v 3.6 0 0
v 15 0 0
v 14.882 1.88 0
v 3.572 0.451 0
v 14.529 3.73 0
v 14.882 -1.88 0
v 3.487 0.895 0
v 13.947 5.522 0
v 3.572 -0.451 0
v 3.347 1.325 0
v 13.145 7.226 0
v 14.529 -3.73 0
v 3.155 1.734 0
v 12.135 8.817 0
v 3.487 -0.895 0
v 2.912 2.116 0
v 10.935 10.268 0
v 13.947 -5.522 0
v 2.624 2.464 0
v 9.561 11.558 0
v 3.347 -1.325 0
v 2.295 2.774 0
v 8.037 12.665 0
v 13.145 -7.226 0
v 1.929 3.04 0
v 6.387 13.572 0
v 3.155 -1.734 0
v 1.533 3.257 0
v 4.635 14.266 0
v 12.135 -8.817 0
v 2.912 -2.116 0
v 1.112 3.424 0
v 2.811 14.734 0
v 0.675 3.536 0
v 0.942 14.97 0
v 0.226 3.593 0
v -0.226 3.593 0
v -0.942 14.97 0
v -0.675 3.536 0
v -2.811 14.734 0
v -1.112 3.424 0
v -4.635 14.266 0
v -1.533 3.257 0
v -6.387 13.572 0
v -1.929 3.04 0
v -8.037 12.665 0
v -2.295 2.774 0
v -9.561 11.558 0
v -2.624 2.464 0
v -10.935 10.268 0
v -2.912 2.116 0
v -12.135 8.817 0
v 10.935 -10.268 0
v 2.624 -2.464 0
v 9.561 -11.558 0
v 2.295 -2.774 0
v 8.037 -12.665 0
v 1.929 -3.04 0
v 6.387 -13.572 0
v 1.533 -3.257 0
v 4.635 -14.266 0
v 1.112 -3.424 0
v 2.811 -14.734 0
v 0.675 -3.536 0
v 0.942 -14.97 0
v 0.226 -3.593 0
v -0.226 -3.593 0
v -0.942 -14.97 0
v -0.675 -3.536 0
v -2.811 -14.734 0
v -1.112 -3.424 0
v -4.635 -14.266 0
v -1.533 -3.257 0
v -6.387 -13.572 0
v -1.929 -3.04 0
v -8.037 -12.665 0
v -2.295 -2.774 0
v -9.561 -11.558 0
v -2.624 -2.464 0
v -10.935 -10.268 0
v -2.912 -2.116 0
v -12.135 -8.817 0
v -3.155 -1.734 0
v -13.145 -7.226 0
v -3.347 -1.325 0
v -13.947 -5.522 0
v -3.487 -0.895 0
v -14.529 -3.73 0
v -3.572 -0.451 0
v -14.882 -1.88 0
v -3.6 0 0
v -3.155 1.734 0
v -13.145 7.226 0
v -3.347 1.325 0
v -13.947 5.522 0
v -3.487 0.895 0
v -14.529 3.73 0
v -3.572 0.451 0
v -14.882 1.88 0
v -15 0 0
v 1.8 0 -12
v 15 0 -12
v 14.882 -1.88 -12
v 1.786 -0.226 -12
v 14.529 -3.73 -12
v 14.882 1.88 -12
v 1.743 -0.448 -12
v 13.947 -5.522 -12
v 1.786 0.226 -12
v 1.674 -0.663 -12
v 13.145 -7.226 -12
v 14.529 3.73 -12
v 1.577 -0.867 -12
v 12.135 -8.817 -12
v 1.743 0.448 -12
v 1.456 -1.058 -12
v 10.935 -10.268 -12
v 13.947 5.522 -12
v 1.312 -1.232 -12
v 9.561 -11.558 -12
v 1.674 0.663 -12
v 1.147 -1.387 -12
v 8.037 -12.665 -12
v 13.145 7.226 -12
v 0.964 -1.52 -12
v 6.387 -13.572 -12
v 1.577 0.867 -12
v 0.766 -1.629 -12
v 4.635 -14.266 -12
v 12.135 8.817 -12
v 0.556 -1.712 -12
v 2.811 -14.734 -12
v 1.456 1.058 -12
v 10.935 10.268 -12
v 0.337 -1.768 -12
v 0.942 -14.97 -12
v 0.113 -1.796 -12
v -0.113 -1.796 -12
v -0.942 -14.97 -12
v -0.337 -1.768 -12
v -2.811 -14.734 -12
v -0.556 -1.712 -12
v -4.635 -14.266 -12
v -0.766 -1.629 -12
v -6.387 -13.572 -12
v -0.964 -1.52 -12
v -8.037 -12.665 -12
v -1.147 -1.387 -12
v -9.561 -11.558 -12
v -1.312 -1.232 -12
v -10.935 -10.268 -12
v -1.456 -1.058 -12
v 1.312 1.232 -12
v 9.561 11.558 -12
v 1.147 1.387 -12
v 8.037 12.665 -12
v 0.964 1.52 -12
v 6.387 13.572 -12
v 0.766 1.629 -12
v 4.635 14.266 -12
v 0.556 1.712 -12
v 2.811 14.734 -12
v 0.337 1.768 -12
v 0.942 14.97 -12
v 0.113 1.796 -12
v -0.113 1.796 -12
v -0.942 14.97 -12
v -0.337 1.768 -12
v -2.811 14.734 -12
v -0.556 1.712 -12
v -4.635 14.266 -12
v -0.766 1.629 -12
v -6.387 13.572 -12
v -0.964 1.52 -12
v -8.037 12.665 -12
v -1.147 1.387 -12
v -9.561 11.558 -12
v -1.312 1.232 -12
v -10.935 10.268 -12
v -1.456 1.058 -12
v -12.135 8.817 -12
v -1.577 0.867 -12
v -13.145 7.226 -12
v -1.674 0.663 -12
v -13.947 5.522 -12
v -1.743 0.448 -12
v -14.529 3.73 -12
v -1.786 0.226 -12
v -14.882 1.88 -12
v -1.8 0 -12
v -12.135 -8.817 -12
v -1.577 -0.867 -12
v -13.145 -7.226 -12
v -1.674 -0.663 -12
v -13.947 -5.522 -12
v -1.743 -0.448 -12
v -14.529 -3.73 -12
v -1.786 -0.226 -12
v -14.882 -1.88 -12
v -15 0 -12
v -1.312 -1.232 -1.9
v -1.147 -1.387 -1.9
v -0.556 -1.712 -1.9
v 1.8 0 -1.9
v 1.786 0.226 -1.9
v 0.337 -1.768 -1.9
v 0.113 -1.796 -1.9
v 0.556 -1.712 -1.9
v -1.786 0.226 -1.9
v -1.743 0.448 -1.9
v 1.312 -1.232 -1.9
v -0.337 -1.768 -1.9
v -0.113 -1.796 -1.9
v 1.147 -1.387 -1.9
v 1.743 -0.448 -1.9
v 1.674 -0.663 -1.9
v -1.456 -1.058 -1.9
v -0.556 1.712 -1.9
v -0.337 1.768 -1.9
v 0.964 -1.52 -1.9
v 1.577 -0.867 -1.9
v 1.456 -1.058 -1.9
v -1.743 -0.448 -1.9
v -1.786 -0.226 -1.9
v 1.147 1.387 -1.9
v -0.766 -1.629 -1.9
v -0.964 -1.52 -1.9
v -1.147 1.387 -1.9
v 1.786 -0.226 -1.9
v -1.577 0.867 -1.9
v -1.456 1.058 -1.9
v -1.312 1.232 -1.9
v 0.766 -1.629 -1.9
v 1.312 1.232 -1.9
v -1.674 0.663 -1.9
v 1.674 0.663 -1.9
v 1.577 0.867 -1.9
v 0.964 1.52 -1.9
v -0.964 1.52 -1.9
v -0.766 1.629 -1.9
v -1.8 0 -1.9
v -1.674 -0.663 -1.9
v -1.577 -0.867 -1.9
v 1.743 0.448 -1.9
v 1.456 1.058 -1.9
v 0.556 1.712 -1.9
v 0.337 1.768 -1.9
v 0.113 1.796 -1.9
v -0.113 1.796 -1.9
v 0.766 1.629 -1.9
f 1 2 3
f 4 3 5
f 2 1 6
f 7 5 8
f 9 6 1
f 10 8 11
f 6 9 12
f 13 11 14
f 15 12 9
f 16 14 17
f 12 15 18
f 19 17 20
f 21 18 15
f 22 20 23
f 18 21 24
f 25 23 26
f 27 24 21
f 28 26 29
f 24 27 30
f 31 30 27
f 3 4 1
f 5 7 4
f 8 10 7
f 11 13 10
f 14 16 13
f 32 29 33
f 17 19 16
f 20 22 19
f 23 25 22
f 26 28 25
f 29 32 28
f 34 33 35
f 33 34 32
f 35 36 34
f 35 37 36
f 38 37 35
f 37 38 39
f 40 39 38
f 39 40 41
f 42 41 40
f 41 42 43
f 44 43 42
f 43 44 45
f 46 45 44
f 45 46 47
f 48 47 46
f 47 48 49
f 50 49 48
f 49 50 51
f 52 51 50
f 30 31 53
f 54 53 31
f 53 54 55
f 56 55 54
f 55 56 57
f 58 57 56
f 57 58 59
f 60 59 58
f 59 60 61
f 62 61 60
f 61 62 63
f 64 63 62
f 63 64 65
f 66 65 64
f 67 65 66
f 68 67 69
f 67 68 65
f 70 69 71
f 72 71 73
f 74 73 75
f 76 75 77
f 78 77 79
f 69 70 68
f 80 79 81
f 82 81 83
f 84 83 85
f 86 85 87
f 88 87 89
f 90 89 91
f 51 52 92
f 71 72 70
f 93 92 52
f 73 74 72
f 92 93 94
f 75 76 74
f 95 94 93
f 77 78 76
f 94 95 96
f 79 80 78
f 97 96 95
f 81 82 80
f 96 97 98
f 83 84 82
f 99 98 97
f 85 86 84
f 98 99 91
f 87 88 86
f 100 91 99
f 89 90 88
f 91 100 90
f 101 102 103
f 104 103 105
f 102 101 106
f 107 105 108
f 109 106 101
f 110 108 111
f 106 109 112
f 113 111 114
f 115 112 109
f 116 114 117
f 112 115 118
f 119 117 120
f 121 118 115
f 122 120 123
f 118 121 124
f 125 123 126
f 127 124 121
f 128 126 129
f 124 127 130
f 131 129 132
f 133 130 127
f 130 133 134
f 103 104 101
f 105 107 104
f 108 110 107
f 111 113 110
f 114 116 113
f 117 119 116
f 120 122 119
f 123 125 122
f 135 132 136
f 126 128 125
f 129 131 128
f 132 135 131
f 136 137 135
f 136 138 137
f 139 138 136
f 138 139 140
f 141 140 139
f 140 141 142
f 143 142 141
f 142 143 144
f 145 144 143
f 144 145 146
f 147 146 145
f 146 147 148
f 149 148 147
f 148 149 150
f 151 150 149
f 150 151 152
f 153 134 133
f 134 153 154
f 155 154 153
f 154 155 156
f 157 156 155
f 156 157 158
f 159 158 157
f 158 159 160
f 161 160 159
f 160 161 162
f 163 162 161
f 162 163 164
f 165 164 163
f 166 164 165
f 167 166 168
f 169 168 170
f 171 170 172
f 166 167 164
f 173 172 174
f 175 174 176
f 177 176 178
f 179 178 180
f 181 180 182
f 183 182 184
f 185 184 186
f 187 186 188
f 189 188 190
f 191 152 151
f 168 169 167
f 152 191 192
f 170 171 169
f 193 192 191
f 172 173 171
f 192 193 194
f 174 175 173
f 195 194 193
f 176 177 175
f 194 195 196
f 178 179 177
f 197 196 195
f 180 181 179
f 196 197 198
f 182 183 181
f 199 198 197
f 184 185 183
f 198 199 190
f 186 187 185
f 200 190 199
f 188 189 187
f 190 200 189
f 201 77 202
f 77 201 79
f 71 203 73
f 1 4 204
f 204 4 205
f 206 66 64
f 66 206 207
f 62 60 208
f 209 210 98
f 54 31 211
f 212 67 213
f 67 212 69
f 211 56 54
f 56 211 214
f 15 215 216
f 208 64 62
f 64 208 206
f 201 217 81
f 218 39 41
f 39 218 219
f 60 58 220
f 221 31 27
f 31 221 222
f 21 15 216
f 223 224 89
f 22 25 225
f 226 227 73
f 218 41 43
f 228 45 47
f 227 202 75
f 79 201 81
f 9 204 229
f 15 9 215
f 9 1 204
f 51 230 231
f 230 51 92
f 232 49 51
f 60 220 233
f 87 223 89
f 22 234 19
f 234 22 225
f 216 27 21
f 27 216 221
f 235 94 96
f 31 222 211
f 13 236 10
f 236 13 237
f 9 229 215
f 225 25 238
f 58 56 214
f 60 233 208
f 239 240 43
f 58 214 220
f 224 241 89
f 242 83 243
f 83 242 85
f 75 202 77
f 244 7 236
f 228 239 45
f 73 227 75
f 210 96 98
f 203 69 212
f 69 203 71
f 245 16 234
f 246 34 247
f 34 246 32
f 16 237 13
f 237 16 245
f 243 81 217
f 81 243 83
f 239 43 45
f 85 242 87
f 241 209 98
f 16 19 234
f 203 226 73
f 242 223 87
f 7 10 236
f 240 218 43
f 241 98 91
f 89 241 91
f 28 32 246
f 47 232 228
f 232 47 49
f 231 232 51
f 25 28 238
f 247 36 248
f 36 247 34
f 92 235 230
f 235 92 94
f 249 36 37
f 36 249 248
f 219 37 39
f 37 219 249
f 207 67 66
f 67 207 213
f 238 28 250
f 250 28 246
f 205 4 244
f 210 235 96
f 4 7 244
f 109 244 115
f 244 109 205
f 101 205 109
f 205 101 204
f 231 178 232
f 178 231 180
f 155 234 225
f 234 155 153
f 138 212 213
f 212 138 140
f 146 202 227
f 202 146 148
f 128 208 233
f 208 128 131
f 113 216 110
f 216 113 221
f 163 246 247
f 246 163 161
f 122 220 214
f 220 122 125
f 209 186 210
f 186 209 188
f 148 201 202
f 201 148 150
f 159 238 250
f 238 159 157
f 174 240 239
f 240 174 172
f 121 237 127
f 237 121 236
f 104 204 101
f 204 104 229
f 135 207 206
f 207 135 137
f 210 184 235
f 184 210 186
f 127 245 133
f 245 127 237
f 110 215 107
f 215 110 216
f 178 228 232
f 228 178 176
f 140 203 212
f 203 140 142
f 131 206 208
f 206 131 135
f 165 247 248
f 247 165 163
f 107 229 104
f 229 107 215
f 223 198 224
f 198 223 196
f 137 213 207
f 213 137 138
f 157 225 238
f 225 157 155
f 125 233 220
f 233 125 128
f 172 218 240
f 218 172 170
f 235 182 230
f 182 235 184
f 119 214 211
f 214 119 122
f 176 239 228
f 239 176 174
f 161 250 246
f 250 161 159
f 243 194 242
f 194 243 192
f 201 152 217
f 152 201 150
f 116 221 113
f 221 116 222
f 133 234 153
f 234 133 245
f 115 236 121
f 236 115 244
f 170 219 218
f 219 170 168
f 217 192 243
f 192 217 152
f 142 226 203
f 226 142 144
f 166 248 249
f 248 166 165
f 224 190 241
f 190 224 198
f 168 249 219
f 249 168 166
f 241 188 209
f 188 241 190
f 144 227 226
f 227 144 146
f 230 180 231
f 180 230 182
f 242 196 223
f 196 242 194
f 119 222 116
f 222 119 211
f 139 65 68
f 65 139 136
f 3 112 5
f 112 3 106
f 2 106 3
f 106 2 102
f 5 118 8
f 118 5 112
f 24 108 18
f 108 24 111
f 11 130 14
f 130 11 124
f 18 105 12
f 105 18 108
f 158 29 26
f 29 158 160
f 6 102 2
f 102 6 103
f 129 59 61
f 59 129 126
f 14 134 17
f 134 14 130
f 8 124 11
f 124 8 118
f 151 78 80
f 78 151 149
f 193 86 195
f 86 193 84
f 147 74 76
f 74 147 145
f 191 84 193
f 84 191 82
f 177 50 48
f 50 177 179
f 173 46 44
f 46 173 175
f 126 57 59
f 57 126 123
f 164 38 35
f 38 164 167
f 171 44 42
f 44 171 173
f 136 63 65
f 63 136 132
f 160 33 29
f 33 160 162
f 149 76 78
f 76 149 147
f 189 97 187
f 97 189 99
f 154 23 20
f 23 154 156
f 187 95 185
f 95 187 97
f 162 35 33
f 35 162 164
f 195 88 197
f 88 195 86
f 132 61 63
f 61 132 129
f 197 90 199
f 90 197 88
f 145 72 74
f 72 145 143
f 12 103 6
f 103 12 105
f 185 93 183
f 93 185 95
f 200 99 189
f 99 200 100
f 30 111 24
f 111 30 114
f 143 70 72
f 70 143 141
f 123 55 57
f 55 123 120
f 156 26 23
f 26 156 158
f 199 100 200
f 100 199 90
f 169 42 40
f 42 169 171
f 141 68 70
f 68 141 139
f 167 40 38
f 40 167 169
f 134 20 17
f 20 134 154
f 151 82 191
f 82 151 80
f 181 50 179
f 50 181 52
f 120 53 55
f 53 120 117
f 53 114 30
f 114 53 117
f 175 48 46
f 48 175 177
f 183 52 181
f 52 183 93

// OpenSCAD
$fn = 50;


difference() {
	union() {
		translate(v = [0, 0, -12.0000000000]) {
			cylinder(h = 12, r = 15.0000000000);
		}
	}
	union() {
		translate(v = [0, 0, 0]) {
			rotate(a = [0, 0, 0]) {
				difference() {
					union() {
						translate(v = [0, 0, -12.0000000000]) {
							cylinder(h = 12, r = 1.5000000000);
						}
						translate(v = [0, 0, -1.9000000000]) {
							cylinder(h = 1.9000000000, r1 = 1.8000000000, r2 = 3.6000000000);
						}
						translate(v = [0, 0, -12.0000000000]) {
							cylinder(h = 12, r = 1.8000000000);
						}
						translate(v = [0, 0, -12.0000000000]) {
							cylinder(h = 12, r = 1.5000000000);
						}
					}
					union();
				}
			}
		}
	}
}
